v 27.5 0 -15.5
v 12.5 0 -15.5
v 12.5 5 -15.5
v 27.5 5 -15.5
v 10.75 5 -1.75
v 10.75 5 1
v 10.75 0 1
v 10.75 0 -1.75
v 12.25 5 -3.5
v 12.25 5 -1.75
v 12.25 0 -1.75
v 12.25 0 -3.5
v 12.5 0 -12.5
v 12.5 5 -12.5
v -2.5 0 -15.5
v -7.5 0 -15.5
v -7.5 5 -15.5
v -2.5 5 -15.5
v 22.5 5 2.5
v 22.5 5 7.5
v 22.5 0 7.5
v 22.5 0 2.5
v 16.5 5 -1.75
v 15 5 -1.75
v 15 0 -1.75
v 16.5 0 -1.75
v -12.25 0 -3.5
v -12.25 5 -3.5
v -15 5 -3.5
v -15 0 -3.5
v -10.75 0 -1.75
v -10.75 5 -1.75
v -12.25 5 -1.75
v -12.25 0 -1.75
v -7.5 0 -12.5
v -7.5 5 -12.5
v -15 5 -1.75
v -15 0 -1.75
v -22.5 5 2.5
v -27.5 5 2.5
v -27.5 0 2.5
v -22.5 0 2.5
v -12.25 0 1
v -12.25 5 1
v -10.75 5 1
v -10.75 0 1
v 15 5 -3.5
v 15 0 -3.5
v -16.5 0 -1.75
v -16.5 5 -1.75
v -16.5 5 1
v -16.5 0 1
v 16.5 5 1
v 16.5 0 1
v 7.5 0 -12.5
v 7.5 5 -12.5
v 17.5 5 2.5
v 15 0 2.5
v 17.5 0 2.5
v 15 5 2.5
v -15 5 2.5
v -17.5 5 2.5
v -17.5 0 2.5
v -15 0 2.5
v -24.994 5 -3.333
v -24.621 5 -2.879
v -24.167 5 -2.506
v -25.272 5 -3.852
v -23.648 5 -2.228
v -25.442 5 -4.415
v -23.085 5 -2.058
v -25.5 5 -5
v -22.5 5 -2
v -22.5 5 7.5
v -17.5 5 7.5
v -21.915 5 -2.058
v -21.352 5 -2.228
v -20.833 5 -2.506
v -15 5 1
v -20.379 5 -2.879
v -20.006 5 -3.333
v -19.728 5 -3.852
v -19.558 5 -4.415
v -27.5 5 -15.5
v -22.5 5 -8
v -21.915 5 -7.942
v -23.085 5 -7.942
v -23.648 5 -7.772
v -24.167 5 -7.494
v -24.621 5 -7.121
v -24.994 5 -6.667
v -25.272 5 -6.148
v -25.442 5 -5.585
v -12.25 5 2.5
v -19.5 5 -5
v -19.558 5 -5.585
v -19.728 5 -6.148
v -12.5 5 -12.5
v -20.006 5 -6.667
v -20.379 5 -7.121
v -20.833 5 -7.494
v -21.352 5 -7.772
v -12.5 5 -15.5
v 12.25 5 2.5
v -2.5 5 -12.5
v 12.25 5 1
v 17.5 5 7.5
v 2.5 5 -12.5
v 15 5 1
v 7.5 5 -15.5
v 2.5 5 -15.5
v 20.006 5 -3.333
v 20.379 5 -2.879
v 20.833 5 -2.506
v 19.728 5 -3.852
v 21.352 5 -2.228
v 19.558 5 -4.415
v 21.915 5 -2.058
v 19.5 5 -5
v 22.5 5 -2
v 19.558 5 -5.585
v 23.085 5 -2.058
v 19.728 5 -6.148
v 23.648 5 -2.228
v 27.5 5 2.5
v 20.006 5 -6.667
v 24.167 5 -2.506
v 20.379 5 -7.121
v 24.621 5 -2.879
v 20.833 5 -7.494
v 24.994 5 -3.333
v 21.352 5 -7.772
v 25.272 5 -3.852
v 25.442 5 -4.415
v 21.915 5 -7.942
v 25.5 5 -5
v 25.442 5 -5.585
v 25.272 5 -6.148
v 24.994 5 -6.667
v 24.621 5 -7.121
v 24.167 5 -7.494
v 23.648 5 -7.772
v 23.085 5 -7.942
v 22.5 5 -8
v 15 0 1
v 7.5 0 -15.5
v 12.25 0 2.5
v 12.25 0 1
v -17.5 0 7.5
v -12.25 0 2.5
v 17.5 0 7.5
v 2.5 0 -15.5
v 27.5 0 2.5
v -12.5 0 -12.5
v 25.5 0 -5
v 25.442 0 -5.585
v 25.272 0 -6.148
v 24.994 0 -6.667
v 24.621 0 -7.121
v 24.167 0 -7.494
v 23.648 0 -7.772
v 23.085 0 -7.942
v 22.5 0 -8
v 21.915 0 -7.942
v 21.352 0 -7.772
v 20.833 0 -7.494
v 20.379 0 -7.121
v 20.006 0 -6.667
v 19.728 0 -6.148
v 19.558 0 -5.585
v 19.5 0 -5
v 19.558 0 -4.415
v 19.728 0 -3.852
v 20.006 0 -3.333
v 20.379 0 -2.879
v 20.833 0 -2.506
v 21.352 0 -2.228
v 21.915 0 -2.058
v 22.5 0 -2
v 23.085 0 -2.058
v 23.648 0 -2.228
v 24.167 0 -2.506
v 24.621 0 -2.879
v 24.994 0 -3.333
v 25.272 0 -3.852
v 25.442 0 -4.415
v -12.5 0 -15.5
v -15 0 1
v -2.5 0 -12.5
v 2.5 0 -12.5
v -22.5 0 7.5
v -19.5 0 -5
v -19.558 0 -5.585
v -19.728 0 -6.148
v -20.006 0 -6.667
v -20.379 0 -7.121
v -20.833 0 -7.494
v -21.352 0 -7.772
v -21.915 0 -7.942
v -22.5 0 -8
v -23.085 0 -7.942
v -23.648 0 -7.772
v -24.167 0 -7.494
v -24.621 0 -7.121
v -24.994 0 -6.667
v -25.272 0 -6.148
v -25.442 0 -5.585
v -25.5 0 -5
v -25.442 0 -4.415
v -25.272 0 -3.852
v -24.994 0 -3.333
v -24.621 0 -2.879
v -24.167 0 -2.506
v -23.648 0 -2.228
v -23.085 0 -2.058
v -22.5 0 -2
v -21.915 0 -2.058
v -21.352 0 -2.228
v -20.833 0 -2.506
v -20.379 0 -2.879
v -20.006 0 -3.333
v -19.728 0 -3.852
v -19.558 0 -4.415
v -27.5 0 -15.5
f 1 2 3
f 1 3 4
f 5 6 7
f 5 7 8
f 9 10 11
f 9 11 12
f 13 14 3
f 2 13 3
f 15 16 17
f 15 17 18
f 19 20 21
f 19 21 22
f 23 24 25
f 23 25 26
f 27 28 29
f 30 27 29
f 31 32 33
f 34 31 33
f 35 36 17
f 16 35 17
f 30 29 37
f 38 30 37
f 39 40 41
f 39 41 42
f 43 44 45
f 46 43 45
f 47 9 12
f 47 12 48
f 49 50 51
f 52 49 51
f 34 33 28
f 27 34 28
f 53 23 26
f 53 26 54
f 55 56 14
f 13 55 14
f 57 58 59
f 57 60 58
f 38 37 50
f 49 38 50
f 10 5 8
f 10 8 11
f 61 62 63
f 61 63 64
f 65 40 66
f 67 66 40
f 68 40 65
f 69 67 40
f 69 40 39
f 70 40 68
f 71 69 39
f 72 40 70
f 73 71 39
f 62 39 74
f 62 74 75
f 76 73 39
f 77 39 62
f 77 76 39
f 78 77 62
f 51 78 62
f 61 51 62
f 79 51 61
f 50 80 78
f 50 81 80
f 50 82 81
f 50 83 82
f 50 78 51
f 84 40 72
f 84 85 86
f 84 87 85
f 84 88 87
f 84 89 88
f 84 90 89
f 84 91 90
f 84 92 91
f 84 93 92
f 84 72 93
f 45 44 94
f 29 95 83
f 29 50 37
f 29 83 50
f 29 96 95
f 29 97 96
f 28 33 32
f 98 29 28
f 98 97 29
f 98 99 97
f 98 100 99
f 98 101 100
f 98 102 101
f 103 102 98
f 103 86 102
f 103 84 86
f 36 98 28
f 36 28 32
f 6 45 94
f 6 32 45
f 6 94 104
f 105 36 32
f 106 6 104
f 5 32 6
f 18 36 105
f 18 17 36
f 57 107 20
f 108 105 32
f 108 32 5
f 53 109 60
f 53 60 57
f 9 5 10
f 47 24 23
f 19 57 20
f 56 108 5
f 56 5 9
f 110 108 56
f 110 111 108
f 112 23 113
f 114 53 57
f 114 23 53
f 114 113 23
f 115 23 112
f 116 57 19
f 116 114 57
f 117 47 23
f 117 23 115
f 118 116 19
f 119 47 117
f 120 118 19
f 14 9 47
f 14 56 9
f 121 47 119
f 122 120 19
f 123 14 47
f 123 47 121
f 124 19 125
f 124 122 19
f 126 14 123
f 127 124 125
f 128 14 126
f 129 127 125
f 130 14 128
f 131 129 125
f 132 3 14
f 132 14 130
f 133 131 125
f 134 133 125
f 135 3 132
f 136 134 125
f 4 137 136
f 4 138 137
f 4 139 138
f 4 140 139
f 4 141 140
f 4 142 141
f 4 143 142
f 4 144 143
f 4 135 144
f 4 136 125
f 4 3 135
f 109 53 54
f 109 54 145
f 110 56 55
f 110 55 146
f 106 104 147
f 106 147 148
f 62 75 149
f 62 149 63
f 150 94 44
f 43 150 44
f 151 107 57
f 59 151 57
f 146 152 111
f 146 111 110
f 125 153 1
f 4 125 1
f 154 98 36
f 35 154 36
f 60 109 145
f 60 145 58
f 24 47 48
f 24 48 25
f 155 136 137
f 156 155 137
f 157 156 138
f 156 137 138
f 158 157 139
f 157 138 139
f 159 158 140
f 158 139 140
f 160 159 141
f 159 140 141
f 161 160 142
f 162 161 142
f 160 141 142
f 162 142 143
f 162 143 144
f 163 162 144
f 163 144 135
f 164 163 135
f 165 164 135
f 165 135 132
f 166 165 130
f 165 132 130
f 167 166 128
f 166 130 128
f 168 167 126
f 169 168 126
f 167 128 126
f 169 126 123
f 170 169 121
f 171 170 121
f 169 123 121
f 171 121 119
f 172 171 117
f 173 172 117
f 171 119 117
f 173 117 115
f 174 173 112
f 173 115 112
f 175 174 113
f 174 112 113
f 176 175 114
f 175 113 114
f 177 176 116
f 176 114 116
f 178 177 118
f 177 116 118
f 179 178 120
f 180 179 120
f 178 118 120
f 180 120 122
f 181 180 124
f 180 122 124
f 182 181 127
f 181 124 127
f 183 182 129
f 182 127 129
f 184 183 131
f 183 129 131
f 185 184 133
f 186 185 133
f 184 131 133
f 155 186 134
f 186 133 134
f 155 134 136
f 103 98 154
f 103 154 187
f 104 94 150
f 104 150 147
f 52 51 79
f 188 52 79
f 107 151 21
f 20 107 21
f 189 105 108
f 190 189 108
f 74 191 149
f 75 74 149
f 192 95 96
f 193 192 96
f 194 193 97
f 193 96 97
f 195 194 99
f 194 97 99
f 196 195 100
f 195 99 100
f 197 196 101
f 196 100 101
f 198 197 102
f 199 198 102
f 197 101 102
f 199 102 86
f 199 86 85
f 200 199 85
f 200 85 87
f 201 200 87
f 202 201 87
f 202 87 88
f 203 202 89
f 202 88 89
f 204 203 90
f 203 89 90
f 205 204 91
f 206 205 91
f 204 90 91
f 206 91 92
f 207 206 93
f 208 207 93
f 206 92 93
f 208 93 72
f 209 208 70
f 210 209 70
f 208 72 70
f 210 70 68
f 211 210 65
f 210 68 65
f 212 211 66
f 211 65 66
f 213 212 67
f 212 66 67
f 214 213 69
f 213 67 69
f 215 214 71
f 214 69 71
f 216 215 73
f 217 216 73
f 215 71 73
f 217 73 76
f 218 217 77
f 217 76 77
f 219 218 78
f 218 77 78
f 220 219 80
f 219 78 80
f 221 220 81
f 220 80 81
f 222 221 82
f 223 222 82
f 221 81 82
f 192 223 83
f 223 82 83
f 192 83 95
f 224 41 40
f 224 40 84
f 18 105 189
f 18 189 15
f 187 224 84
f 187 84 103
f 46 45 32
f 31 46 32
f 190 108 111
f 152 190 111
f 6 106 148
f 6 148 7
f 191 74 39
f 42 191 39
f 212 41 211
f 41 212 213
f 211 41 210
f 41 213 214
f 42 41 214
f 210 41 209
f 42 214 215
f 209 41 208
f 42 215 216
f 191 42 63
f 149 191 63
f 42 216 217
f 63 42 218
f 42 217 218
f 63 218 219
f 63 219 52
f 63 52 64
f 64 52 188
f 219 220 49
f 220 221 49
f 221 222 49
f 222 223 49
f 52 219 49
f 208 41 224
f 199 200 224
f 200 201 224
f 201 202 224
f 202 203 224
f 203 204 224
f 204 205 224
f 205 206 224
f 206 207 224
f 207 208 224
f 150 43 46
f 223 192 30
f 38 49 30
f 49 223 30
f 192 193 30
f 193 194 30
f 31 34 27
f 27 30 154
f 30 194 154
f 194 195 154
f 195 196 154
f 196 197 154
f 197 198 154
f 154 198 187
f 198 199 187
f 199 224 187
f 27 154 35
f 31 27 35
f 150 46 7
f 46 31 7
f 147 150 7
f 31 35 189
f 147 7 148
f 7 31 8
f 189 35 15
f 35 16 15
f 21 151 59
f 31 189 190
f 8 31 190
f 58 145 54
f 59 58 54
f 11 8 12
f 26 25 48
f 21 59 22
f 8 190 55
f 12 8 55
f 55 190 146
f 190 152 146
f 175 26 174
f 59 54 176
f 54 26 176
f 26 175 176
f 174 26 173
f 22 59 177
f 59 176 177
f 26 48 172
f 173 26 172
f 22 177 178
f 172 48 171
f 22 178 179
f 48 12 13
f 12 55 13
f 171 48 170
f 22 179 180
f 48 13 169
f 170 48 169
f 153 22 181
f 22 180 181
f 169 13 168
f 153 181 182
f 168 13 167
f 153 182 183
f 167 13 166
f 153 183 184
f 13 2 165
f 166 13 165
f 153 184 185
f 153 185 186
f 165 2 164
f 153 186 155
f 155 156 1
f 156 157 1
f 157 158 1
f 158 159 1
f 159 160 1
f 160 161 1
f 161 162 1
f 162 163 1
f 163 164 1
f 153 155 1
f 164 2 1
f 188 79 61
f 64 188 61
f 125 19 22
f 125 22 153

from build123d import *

# Parameters (mm, degrees)
ESQUISSE1_W             = 55
ESQUISSE1_H             = 23
BOSS_EXTRU_1_DEPTH      = 5
ESQUISSE2_R             = 3
ENL_V_MAT_EXTRU_1_DEPTH = 5
ENL_V_MAT_EXTRU_2_DEPTH = 10
ESQUISSE5_W             = 5
ESQUISSE5_H             = 5
ESQUISSE5_W_2           = 35
ENL_V_MAT_EXTRU_3_DEPTH = 6
ESQUISSE7_W             = 5
ESQUISSE7_H             = 3
ENL_V_MAT_EXTRU_4_DEPTH = 6


with BuildPart() as part:
    # Esquisse1 → Boss.-Extru.1 (new body)
    with BuildSketch(Plane(origin=(0, 0, 0), x_dir=(1, 0, 0), z_dir=(0, 1, 0))):
        with Locations((0, 4)):
            Rectangle(ESQUISSE1_W, ESQUISSE1_H)
    extrude(amount=BOSS_EXTRU_1_DEPTH)

    # Esquisse2 → Enlèv. mat.-Extru.1 (cut)
    with BuildSketch(Plane(origin=(0, 5, 0), x_dir=(1, 0, 0), z_dir=(0, 1, 0))):
        with Locations((-22.5, 5)):
            Circle(ESQUISSE2_R)
        with Locations((22.5, 5)):
            Circle(ESQUISSE2_R)
    extrude(amount=-ENL_V_MAT_EXTRU_1_DEPTH, mode=Mode.SUBTRACT)

    # Esquisse4 → Enlèv. mat.-Extru.2 (cut)
    with BuildSketch(Plane(origin=(0, 5, 0), x_dir=(1, 0, 0), z_dir=(0, 1, 0))):
        Polygon((-15, 3.5), (-15, 1.75), (-16.5, 1.75), (-16.5, -1), (-15, -1), (-15, -2.5), (-12.25, -2.5), (-12.25, -1), (-10.75, -1), (-10.75, 1.75), (-12.25, 1.75), (-12.25, 3.5), align=None)
        Polygon((12.25, 3.5), (15, 3.5), (15, 1.75), (16.5, 1.75), (16.5, -1), (15, -1), (15, -2.5), (12.25, -2.5), (12.25, -1), (10.75, -1), (10.75, 1.75), (12.25, 1.75), align=None)
    extrude(amount=-ENL_V_MAT_EXTRU_2_DEPTH, mode=Mode.SUBTRACT)

    # Esquisse5 → Enlèv. mat.-Extru.3 (cut, through all)
    with BuildSketch(Plane(origin=(0, 5, 0), x_dir=(1, 0, 0), z_dir=(0, 1, 0))):
        with Locations((-25, -5)):
            Rectangle(ESQUISSE5_W, ESQUISSE5_H)
        with Locations((0, -5)):
            Rectangle(ESQUISSE5_W_2, ESQUISSE5_H)
        with Locations((25, -5)):
            Rectangle(ESQUISSE5_W, ESQUISSE5_H)
    extrude(amount=-ENL_V_MAT_EXTRU_3_DEPTH, mode=Mode.SUBTRACT)

    # Esquisse7 → Enlèv. mat.-Extru.4 (cut, through all)
    with BuildSketch(Plane(origin=(0, 5, 0), x_dir=(1, 0, 0), z_dir=(0, 1, 0))):
        with Locations((0, 14)):
            Rectangle(ESQUISSE7_W, ESQUISSE7_H)
        with Locations((10, 14)):
            Rectangle(ESQUISSE7_W, ESQUISSE7_H)
        with Locations((-10, 14)):
            Rectangle(ESQUISSE7_W, ESQUISSE7_H)
    extrude(amount=-ENL_V_MAT_EXTRU_4_DEPTH, mode=Mode.SUBTRACT)


solid = part.part
